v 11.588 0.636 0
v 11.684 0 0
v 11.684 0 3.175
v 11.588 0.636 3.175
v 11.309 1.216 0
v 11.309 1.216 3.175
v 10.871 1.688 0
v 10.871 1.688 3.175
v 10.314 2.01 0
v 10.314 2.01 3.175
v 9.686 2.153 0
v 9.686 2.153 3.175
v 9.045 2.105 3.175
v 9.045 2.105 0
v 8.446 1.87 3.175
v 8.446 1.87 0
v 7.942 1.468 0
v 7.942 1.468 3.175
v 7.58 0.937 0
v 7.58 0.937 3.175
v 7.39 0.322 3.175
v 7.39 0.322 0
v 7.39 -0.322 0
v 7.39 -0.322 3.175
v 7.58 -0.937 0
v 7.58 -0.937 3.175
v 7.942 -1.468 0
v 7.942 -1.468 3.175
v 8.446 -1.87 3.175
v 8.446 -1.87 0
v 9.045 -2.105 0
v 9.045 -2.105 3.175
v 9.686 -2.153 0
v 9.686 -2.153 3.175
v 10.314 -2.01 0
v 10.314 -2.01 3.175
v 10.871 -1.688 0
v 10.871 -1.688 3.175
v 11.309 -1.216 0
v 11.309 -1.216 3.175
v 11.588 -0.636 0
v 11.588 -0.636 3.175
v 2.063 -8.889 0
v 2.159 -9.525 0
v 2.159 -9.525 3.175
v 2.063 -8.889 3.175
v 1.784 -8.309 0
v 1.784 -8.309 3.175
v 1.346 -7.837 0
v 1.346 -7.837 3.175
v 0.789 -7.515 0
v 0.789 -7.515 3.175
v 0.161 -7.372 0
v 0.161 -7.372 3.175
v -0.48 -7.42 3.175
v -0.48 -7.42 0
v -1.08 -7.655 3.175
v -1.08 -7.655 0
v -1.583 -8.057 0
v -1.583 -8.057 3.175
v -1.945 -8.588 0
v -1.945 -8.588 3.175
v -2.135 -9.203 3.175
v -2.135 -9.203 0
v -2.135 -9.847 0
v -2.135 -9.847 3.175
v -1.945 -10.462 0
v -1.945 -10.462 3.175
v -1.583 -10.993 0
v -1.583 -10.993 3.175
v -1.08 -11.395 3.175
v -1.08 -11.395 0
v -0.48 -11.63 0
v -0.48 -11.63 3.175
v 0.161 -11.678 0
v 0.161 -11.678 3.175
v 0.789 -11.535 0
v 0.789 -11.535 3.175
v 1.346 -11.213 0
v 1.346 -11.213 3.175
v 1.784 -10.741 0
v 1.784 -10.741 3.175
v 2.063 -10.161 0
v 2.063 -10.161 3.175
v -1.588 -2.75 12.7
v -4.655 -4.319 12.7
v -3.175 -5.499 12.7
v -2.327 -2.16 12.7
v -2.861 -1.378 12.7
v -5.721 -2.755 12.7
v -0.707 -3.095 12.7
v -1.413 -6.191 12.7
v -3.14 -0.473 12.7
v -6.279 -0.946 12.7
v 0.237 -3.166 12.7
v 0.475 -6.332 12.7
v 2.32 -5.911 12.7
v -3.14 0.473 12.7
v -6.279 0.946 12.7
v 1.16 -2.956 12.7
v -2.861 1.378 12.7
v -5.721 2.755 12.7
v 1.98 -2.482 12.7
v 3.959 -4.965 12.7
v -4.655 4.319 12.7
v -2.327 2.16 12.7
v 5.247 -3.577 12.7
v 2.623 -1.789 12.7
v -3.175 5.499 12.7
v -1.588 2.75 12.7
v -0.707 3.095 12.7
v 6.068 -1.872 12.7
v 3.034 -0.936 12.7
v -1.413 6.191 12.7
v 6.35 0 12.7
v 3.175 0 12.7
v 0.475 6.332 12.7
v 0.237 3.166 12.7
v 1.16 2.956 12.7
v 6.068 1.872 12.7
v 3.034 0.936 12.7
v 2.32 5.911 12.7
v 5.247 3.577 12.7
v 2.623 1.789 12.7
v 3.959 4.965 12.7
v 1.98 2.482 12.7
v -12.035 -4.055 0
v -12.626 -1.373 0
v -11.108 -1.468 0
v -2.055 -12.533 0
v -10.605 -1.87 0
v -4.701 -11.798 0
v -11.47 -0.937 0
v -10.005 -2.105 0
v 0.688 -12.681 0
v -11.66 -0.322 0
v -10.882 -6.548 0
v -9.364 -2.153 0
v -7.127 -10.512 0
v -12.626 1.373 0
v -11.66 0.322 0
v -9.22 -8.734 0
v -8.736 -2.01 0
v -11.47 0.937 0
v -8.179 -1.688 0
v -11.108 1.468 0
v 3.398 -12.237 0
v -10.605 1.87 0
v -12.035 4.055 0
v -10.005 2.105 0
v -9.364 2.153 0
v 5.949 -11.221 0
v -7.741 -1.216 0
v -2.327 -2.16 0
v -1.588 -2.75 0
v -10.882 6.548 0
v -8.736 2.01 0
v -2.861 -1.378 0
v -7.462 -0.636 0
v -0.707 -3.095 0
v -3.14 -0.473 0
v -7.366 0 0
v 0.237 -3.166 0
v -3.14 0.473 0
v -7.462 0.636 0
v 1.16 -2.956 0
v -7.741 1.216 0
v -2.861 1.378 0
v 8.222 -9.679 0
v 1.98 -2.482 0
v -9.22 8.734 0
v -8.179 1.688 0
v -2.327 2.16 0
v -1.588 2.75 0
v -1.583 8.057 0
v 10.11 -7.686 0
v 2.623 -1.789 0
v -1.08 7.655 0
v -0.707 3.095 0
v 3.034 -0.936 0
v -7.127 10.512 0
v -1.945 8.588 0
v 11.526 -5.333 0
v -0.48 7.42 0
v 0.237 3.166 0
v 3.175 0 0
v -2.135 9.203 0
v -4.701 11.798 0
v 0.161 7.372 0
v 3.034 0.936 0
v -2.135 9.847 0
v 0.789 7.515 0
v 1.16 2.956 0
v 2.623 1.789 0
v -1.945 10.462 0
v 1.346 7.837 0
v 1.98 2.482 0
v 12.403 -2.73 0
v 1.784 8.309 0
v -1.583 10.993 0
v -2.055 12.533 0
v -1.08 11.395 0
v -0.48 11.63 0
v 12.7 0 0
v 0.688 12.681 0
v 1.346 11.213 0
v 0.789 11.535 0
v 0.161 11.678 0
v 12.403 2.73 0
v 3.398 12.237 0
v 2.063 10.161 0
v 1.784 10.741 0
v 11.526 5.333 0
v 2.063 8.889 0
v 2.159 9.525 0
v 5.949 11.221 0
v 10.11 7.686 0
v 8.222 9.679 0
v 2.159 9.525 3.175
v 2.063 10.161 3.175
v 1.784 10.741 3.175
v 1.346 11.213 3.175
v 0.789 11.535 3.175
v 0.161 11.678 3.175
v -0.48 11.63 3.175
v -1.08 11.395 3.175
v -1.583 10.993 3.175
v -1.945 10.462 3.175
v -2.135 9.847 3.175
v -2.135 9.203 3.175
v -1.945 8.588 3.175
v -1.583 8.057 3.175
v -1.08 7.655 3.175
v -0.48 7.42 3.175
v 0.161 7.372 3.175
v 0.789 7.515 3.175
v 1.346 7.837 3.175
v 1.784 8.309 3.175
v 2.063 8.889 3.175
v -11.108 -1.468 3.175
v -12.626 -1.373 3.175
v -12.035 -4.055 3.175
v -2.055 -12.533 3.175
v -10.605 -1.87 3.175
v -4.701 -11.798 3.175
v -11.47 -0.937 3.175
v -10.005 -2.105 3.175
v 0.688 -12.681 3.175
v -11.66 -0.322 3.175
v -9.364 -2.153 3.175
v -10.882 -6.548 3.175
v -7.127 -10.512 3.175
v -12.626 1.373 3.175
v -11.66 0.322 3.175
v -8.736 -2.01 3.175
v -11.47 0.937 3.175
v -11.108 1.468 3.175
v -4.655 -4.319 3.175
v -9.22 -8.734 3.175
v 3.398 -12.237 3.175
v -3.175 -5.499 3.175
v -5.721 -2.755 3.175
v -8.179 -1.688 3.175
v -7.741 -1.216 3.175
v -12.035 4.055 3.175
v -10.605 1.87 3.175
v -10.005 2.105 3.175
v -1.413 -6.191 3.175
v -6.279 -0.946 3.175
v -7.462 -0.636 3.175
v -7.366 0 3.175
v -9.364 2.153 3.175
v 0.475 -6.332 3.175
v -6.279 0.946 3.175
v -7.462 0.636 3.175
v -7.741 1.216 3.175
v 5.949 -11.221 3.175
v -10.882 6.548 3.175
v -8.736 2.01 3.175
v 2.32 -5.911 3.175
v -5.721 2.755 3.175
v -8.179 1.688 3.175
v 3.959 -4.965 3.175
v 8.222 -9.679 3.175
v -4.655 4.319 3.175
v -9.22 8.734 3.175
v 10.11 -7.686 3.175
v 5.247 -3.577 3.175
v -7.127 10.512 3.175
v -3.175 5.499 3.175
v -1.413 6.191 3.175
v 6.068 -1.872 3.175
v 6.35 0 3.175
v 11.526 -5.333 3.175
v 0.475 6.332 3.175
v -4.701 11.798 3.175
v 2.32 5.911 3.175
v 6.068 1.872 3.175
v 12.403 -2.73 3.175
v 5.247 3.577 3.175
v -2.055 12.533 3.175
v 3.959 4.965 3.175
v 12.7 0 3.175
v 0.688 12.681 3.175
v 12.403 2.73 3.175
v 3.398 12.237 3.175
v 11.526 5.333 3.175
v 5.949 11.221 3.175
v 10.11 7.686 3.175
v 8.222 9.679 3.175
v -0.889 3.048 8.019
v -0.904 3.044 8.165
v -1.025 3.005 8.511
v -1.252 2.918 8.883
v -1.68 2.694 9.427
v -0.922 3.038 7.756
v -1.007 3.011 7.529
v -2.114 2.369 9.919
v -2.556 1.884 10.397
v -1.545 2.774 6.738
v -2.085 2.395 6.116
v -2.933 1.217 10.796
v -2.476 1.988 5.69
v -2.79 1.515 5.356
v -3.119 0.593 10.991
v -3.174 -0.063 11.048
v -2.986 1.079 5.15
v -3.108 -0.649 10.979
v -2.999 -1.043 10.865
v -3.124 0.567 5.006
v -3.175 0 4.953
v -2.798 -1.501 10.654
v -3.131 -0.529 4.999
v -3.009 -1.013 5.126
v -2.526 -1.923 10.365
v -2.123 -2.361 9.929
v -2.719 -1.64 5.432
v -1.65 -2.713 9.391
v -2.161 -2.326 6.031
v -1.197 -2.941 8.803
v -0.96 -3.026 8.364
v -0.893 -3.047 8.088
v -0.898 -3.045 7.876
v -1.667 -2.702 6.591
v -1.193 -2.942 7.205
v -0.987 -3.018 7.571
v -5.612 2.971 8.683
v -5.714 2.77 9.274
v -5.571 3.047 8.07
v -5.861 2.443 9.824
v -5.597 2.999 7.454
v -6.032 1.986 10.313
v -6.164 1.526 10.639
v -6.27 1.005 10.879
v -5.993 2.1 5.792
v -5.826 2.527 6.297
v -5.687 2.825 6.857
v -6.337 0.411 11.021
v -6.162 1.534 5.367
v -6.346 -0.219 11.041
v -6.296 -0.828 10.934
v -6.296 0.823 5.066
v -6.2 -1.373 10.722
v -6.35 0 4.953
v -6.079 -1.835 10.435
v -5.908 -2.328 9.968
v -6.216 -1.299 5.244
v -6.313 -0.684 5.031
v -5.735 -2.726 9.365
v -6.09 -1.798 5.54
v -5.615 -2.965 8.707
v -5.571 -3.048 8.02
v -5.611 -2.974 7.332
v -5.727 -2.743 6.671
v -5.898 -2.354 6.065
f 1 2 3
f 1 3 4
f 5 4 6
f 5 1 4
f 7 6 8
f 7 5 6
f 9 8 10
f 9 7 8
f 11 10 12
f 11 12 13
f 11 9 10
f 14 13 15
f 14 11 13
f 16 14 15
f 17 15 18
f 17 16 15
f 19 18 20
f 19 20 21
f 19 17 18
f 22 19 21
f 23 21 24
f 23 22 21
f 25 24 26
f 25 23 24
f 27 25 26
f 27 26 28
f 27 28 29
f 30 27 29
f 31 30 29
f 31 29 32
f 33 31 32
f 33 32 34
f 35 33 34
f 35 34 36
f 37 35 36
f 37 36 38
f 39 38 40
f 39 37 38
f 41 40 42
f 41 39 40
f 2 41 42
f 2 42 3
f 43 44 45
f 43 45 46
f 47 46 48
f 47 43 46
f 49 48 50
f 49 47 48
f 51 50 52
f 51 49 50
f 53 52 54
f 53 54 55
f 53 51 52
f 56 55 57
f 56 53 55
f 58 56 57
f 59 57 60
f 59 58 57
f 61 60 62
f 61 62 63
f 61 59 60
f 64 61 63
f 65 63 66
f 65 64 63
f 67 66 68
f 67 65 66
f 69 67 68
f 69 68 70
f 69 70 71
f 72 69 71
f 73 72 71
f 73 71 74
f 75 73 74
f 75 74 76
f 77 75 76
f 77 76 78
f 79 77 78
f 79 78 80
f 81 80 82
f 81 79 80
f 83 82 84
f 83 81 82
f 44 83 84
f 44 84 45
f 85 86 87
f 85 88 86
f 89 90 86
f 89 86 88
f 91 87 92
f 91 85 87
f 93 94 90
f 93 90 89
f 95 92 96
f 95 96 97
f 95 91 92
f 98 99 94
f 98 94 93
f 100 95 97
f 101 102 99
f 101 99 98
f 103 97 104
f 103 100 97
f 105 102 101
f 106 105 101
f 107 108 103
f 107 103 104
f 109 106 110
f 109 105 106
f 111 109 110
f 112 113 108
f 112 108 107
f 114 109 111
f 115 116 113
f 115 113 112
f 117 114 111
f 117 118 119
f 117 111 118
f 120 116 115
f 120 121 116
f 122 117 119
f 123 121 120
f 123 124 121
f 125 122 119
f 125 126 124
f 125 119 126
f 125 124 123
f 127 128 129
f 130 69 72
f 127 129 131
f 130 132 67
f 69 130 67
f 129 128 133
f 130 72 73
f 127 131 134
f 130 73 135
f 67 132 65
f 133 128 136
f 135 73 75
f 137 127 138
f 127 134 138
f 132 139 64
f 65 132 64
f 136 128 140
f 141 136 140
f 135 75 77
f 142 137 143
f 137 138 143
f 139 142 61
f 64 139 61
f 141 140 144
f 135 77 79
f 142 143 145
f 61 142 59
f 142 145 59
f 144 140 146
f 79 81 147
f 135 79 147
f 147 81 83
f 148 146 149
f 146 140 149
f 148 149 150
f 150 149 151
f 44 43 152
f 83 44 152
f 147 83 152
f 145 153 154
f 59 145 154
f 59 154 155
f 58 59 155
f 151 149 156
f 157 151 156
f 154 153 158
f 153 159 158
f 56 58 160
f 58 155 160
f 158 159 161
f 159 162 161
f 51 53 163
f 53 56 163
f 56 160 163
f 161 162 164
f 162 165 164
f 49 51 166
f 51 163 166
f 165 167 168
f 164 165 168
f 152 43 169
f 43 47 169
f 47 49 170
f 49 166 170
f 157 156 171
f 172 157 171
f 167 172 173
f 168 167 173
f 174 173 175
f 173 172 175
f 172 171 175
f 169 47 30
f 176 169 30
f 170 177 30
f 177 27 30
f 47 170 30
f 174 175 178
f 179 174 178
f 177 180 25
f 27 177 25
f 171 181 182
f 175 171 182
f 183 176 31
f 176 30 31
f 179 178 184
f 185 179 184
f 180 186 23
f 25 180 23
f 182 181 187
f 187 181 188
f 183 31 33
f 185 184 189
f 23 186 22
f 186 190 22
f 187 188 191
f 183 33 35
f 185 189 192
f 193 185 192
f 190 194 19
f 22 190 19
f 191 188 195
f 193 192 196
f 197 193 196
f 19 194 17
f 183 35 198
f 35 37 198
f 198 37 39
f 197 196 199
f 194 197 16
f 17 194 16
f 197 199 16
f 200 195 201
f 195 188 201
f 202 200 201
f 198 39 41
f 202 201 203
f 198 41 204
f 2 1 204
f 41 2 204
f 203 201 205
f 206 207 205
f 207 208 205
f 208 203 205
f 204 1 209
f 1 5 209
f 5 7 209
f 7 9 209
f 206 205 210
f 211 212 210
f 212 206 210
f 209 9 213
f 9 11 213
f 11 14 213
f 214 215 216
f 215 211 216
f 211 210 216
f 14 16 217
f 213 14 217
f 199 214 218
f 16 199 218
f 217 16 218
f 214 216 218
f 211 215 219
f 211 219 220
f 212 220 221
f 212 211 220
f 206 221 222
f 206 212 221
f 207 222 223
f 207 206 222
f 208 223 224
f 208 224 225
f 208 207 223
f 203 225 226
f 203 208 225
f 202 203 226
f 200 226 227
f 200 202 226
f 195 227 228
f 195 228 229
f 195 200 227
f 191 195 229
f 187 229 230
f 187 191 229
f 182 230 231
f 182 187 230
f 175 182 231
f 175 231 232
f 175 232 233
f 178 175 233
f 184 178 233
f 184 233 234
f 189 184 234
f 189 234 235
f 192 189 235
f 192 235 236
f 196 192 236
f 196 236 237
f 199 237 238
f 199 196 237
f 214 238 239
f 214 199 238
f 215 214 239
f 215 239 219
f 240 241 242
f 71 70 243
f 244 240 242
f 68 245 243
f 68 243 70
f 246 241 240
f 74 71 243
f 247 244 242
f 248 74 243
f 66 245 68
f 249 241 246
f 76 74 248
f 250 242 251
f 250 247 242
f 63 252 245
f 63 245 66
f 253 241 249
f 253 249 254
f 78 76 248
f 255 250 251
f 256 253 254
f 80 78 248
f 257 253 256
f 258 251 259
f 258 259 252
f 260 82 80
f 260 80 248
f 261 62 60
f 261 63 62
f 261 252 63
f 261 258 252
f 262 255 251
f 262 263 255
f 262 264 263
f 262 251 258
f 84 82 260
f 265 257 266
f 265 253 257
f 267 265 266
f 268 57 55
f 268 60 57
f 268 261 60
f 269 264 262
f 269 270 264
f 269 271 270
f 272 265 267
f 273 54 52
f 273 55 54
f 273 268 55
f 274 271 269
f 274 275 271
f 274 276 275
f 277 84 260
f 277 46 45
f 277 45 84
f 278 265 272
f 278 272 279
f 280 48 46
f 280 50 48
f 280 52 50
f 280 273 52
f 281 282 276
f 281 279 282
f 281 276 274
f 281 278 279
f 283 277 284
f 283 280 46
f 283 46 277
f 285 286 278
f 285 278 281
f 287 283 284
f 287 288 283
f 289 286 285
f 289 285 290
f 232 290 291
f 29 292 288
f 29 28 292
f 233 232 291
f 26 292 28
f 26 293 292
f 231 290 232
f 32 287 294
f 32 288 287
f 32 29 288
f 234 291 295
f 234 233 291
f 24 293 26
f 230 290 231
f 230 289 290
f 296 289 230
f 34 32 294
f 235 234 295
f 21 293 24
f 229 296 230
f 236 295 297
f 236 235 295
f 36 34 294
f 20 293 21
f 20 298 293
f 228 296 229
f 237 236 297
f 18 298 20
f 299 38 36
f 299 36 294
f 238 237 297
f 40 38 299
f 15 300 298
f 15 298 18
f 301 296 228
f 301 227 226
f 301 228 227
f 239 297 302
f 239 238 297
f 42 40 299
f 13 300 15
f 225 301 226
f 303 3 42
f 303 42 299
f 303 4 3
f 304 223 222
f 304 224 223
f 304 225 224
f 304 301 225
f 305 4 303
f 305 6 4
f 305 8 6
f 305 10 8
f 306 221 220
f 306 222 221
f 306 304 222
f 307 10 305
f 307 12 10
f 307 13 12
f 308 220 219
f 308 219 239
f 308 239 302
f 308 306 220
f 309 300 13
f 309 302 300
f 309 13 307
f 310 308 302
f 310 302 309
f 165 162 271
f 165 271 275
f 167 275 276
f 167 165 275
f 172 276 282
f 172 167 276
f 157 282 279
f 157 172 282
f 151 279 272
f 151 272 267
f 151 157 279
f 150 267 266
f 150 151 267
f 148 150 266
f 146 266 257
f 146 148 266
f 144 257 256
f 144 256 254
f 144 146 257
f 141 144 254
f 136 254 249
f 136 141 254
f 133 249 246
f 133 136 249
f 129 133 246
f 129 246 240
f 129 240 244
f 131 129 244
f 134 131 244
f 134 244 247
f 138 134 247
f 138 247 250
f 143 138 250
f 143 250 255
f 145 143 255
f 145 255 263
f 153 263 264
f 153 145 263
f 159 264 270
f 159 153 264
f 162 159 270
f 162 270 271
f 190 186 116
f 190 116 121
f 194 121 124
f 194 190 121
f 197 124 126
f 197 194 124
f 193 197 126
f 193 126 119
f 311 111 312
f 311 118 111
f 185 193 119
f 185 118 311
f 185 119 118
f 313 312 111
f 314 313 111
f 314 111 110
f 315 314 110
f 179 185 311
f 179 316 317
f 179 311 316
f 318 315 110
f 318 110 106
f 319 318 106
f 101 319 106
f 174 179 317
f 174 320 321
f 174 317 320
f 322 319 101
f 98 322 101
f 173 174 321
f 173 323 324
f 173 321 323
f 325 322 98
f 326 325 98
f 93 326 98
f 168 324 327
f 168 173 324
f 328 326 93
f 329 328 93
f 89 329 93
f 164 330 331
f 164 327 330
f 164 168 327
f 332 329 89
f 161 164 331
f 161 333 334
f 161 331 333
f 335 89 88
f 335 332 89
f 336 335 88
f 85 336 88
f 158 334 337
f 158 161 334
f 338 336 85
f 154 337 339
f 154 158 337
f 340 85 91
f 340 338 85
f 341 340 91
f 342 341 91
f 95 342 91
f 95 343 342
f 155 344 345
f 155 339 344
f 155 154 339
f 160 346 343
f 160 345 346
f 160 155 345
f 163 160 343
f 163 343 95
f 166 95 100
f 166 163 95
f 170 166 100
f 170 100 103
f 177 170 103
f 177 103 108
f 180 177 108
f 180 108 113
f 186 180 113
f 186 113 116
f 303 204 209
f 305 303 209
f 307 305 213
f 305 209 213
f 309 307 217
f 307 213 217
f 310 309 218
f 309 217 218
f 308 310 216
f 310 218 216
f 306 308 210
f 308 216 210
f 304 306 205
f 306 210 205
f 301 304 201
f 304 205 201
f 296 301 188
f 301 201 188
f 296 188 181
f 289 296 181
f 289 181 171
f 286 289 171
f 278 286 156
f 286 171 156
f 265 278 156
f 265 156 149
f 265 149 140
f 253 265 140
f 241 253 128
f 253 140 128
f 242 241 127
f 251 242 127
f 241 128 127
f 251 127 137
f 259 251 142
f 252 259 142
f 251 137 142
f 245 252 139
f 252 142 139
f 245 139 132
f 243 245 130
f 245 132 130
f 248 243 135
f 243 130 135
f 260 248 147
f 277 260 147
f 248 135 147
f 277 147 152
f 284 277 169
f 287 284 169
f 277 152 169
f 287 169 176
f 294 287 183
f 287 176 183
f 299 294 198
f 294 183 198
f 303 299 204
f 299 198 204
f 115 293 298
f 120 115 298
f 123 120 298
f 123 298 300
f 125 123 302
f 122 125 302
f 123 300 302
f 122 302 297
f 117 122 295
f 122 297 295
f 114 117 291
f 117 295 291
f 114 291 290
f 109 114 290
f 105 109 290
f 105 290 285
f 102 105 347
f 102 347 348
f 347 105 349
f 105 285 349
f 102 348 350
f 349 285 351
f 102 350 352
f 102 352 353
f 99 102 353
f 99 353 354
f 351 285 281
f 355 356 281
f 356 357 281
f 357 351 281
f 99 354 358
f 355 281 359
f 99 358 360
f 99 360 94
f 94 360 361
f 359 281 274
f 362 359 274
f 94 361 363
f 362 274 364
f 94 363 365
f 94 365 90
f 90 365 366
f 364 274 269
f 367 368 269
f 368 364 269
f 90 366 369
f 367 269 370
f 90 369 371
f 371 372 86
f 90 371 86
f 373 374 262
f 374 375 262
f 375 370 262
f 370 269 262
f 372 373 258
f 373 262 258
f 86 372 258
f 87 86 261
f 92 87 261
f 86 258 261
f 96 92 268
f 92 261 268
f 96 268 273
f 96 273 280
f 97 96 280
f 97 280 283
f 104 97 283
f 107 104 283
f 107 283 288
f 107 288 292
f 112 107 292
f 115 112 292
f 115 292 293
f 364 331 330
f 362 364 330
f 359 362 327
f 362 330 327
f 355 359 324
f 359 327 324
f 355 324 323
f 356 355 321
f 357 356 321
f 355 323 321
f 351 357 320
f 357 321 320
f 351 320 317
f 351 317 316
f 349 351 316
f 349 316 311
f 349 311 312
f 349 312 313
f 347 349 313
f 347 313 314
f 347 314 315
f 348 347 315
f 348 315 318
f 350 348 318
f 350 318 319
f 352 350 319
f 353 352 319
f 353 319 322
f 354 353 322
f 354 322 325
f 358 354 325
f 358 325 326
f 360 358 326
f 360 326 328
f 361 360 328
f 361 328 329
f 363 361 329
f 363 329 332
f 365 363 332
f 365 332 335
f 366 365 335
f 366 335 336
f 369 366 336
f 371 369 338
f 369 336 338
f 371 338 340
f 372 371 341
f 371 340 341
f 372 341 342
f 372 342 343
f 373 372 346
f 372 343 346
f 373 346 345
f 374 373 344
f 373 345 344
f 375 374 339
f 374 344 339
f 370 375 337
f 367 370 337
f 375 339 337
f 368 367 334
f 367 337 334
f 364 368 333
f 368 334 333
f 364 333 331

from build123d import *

# Parameters (mm, degrees)
SKETCH2_R           = 12.7
SKETCH2_R_2         = 6.35
SKETCH2_R_3         = 2.159
BOSS_EXTRUDE1_DEPTH = 3.175
SKETCH2_3_R         = 6.35
SKETCH2_3_R_2       = 3.175
BOSS_EXTRUDE2_DEPTH = 12.7
SKETCH4_R           = 3.048
CUT_EXTRUDE1_DEPTH  = 12.7


with BuildPart() as part:
    # Sketch2 → Boss-Extrude1 (new body)
    with BuildSketch(Plane.XY):
        Circle(SKETCH2_R)
        Circle(SKETCH2_R_2, mode=Mode.SUBTRACT)
        with Locations((0, 9.525)):
            Circle(SKETCH2_R_3, mode=Mode.SUBTRACT)
        with Locations((9.525, 0)):
            Circle(SKETCH2_R_3, mode=Mode.SUBTRACT)
        with Locations((0, -9.525)):
            Circle(SKETCH2_R_3, mode=Mode.SUBTRACT)
        with Locations((-9.525, 0)):
            Circle(SKETCH2_R_3, mode=Mode.SUBTRACT)
    extrude(amount=BOSS_EXTRUDE1_DEPTH)

    # Sketch2<3> → Boss-Extrude2 (add)
    with BuildSketch(Plane.XY):
        Circle(SKETCH2_3_R)
        Circle(SKETCH2_3_R_2, mode=Mode.SUBTRACT)
    extrude(amount=BOSS_EXTRUDE2_DEPTH)

    # Sketch4 → Cut-Extrude1 (cut)
    with BuildSketch(Plane(origin=(0, 0, 0), x_dir=(0, 0, -1), z_dir=(1, 0, 0))):
        with Locations((-8.001, 0)):
            Circle(SKETCH4_R)
    extrude(amount=-CUT_EXTRUDE1_DEPTH, mode=Mode.SUBTRACT)


solid = part.part
